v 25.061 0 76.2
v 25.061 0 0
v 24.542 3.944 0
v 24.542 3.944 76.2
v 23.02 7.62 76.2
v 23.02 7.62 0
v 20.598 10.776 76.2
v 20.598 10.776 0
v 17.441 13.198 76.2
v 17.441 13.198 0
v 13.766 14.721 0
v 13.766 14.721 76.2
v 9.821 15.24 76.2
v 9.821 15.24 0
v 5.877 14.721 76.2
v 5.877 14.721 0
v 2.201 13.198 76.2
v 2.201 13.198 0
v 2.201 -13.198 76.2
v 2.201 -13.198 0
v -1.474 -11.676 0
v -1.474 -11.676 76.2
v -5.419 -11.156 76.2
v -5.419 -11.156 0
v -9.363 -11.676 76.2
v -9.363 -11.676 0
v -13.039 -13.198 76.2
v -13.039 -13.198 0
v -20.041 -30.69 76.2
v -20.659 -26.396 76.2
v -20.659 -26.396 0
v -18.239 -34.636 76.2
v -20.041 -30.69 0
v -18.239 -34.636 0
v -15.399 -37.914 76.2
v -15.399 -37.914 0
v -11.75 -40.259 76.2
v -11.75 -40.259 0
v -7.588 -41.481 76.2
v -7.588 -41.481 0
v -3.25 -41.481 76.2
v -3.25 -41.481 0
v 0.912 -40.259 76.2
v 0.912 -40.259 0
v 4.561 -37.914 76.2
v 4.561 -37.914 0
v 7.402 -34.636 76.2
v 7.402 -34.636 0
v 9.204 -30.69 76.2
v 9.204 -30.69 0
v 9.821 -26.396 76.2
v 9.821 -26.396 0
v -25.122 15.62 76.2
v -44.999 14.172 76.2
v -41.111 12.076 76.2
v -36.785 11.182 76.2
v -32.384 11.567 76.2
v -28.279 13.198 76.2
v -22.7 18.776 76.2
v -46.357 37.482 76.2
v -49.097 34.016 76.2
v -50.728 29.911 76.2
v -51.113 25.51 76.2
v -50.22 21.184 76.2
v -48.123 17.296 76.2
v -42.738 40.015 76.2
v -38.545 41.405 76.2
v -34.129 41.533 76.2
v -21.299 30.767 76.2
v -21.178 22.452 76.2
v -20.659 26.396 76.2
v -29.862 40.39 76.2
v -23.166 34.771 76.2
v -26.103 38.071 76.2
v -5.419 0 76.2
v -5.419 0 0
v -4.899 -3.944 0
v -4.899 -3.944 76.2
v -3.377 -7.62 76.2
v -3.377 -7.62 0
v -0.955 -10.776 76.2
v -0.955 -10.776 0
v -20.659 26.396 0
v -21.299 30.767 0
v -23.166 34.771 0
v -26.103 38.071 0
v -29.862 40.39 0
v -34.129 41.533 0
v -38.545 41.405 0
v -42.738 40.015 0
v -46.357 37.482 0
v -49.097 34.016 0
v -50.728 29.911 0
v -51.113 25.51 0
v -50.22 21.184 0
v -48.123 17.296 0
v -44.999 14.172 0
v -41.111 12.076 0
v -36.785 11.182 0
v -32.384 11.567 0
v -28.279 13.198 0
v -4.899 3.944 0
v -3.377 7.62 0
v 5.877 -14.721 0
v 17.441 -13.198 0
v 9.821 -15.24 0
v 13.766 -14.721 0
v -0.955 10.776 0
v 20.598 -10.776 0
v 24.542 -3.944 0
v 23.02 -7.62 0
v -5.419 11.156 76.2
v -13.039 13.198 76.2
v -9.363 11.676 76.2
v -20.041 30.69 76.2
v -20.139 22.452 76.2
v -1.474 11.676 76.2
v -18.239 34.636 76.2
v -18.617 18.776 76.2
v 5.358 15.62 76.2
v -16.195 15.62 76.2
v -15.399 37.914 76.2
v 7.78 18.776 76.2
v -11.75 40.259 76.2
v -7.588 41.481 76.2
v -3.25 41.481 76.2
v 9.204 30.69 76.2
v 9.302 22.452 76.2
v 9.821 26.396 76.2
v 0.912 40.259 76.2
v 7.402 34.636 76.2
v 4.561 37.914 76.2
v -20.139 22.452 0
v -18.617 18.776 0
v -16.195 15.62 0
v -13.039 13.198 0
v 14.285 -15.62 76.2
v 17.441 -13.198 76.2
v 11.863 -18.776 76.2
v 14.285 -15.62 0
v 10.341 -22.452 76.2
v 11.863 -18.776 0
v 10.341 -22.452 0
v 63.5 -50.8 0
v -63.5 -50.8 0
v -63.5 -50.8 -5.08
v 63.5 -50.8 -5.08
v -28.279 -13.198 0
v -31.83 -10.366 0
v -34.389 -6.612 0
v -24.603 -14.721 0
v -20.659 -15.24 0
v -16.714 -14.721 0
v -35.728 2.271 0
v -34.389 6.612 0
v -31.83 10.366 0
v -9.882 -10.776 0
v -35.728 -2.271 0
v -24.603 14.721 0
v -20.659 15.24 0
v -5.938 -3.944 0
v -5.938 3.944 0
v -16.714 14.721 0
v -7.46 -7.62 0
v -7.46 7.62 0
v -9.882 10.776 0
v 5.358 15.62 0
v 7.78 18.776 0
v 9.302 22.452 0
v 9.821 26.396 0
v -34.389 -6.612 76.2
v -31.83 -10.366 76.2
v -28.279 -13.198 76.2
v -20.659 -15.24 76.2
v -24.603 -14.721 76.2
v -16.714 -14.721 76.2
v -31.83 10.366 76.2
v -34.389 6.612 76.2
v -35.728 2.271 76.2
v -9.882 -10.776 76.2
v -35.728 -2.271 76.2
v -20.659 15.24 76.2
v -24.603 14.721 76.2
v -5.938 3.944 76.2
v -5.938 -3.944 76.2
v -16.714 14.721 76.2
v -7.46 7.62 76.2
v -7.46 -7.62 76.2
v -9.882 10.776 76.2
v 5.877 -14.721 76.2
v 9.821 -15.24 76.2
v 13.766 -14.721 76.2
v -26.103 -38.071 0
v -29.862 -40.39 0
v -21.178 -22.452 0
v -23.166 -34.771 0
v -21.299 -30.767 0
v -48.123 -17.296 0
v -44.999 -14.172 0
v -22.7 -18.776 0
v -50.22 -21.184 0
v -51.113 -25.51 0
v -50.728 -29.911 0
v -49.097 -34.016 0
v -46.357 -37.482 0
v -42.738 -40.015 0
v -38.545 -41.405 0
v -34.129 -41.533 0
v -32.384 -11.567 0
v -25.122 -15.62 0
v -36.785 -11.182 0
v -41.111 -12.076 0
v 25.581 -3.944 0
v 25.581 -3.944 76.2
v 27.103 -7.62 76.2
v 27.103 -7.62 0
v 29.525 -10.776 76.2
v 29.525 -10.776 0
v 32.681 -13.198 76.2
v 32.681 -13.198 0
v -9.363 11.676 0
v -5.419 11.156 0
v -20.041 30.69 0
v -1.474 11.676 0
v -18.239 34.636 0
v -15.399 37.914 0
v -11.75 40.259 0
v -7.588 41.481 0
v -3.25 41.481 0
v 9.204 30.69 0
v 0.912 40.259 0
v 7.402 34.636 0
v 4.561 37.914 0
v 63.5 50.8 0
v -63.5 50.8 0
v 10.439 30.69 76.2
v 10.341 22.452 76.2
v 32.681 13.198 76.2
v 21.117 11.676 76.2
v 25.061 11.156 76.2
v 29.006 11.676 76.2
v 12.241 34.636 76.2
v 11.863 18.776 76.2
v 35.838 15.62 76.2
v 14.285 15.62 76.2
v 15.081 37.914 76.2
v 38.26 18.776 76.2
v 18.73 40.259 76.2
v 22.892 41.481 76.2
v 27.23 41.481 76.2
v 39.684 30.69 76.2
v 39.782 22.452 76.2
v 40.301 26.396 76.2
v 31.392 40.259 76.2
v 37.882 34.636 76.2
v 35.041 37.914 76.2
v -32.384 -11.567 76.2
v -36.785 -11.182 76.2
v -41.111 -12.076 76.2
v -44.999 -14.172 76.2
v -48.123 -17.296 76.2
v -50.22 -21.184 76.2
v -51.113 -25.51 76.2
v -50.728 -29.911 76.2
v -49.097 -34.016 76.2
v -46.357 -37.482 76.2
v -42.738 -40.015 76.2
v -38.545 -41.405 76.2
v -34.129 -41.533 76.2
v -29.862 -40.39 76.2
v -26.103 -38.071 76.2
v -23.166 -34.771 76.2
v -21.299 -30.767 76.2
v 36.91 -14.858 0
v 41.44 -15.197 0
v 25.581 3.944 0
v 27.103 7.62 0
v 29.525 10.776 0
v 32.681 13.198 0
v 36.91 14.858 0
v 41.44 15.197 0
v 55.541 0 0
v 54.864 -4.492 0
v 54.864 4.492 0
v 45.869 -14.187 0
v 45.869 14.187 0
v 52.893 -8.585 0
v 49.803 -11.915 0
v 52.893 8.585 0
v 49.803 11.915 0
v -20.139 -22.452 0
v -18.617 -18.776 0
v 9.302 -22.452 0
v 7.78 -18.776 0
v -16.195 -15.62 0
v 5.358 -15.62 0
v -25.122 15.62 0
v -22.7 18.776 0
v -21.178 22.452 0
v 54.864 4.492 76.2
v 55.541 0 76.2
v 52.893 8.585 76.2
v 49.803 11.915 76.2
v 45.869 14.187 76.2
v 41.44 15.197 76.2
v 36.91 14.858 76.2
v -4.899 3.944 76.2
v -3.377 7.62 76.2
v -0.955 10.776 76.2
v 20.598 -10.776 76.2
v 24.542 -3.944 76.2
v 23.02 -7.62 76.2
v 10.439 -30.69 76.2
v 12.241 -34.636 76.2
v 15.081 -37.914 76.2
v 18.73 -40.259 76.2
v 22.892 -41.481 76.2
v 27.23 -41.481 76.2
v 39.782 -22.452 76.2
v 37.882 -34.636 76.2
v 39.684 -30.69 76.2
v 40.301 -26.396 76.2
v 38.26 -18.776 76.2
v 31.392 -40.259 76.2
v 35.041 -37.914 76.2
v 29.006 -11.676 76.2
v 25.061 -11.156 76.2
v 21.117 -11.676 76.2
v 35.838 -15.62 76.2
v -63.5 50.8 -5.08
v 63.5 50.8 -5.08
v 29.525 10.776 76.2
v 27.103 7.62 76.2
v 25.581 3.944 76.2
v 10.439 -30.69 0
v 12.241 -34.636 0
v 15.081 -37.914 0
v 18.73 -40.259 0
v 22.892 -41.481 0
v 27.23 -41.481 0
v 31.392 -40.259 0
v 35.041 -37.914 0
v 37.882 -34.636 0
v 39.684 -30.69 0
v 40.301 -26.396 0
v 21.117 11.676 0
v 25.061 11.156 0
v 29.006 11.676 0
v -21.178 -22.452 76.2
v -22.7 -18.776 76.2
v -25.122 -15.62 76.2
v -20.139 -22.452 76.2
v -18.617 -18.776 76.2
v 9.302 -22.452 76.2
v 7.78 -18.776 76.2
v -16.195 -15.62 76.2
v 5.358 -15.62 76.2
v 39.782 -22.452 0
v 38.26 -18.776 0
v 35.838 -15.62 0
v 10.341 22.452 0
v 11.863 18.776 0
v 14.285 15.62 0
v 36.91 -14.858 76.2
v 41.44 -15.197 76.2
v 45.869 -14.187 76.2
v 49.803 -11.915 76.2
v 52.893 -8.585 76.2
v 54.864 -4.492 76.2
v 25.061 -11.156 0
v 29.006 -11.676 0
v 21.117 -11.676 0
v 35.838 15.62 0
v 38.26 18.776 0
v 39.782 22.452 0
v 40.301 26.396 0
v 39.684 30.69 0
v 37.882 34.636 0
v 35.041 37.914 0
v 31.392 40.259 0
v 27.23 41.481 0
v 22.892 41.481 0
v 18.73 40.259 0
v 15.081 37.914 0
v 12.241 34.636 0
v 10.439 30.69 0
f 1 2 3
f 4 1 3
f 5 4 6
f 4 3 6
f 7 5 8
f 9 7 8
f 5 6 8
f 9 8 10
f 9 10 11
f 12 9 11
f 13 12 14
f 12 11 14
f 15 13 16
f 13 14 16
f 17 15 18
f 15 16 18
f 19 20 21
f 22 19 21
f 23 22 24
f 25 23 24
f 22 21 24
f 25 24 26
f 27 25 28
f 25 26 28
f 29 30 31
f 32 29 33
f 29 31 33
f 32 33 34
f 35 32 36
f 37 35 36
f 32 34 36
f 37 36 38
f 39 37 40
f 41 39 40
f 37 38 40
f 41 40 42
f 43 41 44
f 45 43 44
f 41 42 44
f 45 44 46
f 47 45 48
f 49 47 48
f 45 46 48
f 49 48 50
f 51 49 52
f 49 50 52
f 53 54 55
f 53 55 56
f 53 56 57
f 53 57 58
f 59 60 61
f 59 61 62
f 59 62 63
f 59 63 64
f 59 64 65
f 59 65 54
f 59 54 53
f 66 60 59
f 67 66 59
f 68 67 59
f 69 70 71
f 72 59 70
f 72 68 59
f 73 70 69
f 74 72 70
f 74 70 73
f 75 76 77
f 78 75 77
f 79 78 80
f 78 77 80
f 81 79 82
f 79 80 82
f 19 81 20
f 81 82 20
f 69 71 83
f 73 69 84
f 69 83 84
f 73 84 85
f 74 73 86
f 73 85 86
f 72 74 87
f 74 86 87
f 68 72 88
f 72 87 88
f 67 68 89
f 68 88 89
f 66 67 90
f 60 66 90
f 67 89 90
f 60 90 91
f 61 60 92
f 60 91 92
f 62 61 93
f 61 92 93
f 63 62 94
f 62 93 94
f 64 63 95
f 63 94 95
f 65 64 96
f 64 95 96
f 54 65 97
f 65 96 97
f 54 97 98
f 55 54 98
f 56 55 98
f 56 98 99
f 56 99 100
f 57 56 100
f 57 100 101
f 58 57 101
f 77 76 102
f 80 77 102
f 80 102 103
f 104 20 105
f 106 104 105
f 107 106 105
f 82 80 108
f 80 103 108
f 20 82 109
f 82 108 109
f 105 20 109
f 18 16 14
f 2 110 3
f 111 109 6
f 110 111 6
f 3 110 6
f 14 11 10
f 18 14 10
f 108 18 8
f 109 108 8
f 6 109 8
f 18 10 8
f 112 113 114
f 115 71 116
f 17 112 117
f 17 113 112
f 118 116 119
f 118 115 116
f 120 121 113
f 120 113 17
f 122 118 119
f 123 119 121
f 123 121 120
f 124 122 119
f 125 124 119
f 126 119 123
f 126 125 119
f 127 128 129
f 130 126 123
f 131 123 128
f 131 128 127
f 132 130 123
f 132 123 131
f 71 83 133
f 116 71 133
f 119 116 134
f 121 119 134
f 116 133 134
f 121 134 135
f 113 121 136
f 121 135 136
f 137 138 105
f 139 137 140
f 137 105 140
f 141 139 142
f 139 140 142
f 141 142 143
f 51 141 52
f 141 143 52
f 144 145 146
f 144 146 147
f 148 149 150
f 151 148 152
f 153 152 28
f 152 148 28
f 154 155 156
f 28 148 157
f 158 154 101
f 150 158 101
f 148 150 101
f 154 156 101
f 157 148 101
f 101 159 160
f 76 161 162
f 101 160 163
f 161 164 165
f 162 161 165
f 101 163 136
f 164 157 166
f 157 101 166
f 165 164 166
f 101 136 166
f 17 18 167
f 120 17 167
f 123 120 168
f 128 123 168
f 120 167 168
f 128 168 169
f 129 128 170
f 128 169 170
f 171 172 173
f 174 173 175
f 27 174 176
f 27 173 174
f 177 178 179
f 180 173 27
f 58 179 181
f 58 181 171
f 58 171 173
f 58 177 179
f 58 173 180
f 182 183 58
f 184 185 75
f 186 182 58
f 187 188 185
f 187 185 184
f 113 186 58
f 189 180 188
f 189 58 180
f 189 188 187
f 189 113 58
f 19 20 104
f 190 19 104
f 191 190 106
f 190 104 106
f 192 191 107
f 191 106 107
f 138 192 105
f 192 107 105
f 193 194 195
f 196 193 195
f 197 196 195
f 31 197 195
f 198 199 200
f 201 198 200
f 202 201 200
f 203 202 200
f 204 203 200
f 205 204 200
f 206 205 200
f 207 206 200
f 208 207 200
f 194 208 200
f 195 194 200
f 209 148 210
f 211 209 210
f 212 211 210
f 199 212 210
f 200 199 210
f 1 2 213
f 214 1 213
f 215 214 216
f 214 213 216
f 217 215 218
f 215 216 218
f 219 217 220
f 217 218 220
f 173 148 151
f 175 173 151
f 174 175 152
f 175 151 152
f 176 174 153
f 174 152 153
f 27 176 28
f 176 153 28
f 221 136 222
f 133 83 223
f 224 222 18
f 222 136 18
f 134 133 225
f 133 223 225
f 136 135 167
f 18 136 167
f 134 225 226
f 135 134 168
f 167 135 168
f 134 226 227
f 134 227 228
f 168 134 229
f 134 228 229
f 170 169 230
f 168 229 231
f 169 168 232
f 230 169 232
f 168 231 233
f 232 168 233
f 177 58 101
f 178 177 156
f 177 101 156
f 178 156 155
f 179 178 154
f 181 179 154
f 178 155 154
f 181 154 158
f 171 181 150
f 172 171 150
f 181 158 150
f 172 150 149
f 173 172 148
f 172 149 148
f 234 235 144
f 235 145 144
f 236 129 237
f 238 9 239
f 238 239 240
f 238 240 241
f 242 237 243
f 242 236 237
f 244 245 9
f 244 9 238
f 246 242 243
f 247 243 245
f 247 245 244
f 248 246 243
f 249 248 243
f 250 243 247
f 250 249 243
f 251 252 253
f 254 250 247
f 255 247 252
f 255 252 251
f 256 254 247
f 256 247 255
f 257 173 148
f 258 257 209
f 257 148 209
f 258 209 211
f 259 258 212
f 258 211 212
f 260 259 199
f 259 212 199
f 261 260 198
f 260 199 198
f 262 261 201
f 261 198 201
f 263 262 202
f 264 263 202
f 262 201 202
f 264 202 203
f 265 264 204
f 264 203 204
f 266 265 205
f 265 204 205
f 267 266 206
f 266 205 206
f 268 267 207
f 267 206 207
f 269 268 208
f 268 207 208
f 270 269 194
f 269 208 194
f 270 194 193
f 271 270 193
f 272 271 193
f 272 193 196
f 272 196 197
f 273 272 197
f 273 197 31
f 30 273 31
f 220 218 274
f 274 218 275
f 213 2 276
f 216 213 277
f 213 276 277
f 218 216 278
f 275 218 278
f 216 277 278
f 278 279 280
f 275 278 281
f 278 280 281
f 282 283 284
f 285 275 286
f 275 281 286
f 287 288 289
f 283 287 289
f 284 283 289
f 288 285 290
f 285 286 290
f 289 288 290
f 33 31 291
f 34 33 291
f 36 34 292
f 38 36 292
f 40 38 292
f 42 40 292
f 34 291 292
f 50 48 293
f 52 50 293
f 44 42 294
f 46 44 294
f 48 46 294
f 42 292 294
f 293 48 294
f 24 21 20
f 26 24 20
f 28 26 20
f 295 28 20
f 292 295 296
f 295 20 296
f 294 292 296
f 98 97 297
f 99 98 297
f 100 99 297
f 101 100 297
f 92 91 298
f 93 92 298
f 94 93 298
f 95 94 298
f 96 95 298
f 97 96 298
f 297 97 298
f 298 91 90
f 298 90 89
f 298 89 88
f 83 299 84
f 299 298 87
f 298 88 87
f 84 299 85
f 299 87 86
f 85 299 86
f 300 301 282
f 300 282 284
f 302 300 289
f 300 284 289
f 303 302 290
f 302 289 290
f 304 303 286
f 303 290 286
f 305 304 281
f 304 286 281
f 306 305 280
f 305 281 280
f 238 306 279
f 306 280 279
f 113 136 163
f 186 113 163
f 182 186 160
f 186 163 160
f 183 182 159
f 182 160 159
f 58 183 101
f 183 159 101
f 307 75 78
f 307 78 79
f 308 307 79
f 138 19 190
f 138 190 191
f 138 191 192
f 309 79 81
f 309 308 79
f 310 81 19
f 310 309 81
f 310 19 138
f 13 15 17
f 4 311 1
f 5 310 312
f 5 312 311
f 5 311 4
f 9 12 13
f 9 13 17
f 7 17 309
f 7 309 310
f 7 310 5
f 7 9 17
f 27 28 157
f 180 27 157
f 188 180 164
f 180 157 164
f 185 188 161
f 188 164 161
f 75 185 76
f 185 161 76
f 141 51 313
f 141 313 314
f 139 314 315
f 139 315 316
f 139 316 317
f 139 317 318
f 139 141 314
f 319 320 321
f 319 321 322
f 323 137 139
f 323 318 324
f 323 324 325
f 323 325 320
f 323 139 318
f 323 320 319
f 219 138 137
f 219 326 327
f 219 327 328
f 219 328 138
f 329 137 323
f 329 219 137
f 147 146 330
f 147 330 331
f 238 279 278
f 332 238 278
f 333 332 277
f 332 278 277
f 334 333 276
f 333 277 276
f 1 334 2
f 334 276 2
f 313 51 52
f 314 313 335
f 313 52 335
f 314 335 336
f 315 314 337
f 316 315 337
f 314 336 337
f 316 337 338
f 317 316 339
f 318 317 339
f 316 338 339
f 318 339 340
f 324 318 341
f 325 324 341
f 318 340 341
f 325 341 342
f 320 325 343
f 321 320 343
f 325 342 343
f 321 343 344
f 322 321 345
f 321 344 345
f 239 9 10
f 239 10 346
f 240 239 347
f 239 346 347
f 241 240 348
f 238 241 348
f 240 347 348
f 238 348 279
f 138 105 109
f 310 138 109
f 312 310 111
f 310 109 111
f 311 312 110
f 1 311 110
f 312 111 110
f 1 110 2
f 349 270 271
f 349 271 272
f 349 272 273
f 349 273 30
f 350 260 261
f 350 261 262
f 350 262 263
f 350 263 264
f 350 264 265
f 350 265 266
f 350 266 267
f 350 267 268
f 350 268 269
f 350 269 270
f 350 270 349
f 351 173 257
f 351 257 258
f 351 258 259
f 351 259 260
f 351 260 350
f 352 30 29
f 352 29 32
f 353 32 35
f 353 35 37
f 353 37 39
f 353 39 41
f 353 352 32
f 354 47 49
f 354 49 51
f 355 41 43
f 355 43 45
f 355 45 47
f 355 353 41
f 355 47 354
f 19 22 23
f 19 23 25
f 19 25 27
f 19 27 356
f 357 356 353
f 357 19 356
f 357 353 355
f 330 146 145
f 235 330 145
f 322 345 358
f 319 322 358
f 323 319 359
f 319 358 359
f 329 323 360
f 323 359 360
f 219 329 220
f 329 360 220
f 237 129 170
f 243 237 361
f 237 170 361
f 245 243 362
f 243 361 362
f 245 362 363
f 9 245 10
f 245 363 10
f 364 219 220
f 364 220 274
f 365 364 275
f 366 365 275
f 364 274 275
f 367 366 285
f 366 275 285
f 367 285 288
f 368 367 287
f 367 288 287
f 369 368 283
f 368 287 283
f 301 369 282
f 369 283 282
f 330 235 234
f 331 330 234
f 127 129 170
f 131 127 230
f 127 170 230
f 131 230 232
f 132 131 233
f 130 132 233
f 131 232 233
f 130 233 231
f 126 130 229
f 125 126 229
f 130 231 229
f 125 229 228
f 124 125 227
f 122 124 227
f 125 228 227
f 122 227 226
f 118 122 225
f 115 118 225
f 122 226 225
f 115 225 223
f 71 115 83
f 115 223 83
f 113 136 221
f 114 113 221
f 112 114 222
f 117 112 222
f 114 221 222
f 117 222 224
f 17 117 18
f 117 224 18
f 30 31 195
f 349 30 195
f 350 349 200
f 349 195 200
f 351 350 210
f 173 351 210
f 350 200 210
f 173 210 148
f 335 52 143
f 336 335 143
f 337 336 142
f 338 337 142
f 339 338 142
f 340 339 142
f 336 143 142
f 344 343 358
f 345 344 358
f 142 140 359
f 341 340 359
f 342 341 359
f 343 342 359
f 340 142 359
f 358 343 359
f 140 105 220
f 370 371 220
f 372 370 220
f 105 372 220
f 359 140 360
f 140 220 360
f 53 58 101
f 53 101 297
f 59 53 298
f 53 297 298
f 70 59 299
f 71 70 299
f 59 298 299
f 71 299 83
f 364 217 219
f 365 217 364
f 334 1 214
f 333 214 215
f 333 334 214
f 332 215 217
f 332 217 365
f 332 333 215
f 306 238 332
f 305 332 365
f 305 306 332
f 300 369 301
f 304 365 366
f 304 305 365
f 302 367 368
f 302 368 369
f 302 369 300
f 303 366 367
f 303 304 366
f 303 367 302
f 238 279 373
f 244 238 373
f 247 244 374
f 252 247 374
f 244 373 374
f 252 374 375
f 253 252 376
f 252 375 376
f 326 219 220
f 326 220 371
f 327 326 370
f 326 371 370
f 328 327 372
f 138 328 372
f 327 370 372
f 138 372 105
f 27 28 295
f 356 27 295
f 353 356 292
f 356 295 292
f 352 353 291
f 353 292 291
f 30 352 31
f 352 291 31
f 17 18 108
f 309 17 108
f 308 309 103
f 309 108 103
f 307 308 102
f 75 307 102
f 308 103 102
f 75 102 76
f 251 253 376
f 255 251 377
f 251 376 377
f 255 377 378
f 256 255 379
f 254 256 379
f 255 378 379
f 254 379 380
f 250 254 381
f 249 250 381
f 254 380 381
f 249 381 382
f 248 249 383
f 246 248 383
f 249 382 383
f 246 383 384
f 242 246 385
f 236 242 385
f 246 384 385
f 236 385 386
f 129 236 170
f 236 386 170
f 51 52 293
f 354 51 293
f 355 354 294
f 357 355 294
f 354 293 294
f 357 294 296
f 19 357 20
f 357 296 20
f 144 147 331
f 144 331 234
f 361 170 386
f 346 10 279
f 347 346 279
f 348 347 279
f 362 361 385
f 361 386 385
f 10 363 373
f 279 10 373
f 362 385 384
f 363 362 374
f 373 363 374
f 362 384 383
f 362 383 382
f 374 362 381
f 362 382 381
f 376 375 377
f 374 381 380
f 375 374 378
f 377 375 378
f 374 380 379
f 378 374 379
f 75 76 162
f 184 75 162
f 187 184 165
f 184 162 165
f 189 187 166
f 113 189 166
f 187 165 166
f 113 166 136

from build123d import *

# Parameters (mm, degrees)
F1_DEPTH = 76.2
F2_W     = 127
F2_H     = 5.08
F3_DEPTH = 50.8


with BuildPart() as f1:
    # F0 (on Top) → F1 (new body)
    with BuildSketch(Plane.XY):
        with BuildLine():
            ThreePointArc((-28.278636, 13.198227), (-22.700409, 18.776454), (-20.658636, 26.396454))
            ThreePointArc((-20.658636, 26.396454), (-49.096863, 34.016454), (-28.278636, 13.198227))
        make_face()
        with BuildLine():
            ThreePointArc((9.821364, 26.396454), (-5.418636, 41.636454), (-20.658636, 26.396454))
            ThreePointArc((-20.658636, 26.396454), (-18.616863, 18.776454), (-13.038636, 13.198227))
            ThreePointArc((-13.038636, 13.198227), (-5.418636, 11.156454), (2.201364, 13.198227))
            ThreePointArc((2.201364, 13.198227), (7.779591, 18.776454), (9.821364, 26.396454))
        make_face()
        with BuildLine():
            ThreePointArc((40.301364, 26.396454), (25.061364, 41.636454), (9.821364, 26.396454))
            ThreePointArc((9.821364, 26.396454), (11.863137, 18.776454), (17.441364, 13.198227))
            ThreePointArc((17.441364, 13.198227), (25.061364, 11.156454), (32.681364, 13.198227))
            ThreePointArc((32.681364, 13.198227), (38.259591, 18.776454), (40.301364, 26.396454))
        make_face()
        with BuildLine():
            ThreePointArc((55.541364, 0), (47.921364, 13.198227), (32.681364, 13.198227))
            ThreePointArc((32.681364, 13.198227), (27.103137, 7.62), (25.061364, 0))
            ThreePointArc((25.061364, 0), (27.103137, -7.62), (32.681364, -13.198227))
            ThreePointArc((32.681364, -13.198227), (47.921364, -13.198227), (55.541364, 0))
        make_face()
        with BuildLine():
            ThreePointArc((17.441364, 13.198227), (9.821364, 15.24), (2.201364, 13.198227))
            ThreePointArc((2.201364, 13.198227), (-3.376863, 7.62), (-5.418636, 0))
            ThreePointArc((-5.418636, 0), (-3.376863, -7.62), (2.201364, -13.198227))
            ThreePointArc((2.201364, -13.198227), (9.821364, -15.24), (17.441364, -13.198227))
            ThreePointArc((17.441364, -13.198227), (23.019591, -7.62), (25.061364, 0))
            ThreePointArc((25.061364, 0), (23.019591, 7.62), (17.441364, 13.198227))
        make_face()
        with BuildLine():
            ThreePointArc((-13.038636, 13.198227), (-20.658636, 15.24), (-28.278636, 13.198227))
            ThreePointArc((-28.278636, 13.198227), (-35.898636, 0), (-28.278636, -13.198227))
            ThreePointArc((-28.278636, -13.198227), (-20.658636, -15.24), (-13.038636, -13.198227))
            ThreePointArc((-13.038636, -13.198227), (-7.460409, -7.62), (-5.418636, 0))
            ThreePointArc((-5.418636, 0), (-7.460409, 7.62), (-13.038636, 13.198227))
        make_face()
        with BuildLine():
            ThreePointArc((-20.658636, -26.396454), (-22.700409, -18.776454), (-28.278636, -13.198227))
            ThreePointArc((-28.278636, -13.198227), (-49.096863, -34.016454), (-20.658636, -26.396454))
        make_face()
        with BuildLine():
            ThreePointArc((2.201364, -13.198227), (-5.418636, -11.156454), (-13.038636, -13.198227))
            ThreePointArc((-13.038636, -13.198227), (-18.616863, -18.776454), (-20.658636, -26.396454))
            ThreePointArc((-20.658636, -26.396454), (-5.418636, -41.636454), (9.821364, -26.396454))
            ThreePointArc((9.821364, -26.396454), (7.779591, -18.776454), (2.201364, -13.198227))
        make_face()
        with BuildLine():
            ThreePointArc((17.441364, -13.198227), (11.863137, -18.776454), (9.821364, -26.396454))
            ThreePointArc((9.821364, -26.396454), (25.061364, -41.636454), (40.301364, -26.396454))
            ThreePointArc((40.301364, -26.396454), (38.259591, -18.776454), (32.681364, -13.198227))
            ThreePointArc((32.681364, -13.198227), (25.061364, -11.156454), (17.441364, -13.198227))
        make_face()
    extrude(amount=F1_DEPTH)


with BuildPart() as f3:
    # F2 (on Front) → F3 (new body, symmetric)
    with BuildSketch(Plane.XZ):
        with Locations((0, -2.54)):
            Rectangle(F2_W, F2_H)
    extrude(amount=F3_DEPTH, both=True)


solid = Compound([f1.part, f3.part])
